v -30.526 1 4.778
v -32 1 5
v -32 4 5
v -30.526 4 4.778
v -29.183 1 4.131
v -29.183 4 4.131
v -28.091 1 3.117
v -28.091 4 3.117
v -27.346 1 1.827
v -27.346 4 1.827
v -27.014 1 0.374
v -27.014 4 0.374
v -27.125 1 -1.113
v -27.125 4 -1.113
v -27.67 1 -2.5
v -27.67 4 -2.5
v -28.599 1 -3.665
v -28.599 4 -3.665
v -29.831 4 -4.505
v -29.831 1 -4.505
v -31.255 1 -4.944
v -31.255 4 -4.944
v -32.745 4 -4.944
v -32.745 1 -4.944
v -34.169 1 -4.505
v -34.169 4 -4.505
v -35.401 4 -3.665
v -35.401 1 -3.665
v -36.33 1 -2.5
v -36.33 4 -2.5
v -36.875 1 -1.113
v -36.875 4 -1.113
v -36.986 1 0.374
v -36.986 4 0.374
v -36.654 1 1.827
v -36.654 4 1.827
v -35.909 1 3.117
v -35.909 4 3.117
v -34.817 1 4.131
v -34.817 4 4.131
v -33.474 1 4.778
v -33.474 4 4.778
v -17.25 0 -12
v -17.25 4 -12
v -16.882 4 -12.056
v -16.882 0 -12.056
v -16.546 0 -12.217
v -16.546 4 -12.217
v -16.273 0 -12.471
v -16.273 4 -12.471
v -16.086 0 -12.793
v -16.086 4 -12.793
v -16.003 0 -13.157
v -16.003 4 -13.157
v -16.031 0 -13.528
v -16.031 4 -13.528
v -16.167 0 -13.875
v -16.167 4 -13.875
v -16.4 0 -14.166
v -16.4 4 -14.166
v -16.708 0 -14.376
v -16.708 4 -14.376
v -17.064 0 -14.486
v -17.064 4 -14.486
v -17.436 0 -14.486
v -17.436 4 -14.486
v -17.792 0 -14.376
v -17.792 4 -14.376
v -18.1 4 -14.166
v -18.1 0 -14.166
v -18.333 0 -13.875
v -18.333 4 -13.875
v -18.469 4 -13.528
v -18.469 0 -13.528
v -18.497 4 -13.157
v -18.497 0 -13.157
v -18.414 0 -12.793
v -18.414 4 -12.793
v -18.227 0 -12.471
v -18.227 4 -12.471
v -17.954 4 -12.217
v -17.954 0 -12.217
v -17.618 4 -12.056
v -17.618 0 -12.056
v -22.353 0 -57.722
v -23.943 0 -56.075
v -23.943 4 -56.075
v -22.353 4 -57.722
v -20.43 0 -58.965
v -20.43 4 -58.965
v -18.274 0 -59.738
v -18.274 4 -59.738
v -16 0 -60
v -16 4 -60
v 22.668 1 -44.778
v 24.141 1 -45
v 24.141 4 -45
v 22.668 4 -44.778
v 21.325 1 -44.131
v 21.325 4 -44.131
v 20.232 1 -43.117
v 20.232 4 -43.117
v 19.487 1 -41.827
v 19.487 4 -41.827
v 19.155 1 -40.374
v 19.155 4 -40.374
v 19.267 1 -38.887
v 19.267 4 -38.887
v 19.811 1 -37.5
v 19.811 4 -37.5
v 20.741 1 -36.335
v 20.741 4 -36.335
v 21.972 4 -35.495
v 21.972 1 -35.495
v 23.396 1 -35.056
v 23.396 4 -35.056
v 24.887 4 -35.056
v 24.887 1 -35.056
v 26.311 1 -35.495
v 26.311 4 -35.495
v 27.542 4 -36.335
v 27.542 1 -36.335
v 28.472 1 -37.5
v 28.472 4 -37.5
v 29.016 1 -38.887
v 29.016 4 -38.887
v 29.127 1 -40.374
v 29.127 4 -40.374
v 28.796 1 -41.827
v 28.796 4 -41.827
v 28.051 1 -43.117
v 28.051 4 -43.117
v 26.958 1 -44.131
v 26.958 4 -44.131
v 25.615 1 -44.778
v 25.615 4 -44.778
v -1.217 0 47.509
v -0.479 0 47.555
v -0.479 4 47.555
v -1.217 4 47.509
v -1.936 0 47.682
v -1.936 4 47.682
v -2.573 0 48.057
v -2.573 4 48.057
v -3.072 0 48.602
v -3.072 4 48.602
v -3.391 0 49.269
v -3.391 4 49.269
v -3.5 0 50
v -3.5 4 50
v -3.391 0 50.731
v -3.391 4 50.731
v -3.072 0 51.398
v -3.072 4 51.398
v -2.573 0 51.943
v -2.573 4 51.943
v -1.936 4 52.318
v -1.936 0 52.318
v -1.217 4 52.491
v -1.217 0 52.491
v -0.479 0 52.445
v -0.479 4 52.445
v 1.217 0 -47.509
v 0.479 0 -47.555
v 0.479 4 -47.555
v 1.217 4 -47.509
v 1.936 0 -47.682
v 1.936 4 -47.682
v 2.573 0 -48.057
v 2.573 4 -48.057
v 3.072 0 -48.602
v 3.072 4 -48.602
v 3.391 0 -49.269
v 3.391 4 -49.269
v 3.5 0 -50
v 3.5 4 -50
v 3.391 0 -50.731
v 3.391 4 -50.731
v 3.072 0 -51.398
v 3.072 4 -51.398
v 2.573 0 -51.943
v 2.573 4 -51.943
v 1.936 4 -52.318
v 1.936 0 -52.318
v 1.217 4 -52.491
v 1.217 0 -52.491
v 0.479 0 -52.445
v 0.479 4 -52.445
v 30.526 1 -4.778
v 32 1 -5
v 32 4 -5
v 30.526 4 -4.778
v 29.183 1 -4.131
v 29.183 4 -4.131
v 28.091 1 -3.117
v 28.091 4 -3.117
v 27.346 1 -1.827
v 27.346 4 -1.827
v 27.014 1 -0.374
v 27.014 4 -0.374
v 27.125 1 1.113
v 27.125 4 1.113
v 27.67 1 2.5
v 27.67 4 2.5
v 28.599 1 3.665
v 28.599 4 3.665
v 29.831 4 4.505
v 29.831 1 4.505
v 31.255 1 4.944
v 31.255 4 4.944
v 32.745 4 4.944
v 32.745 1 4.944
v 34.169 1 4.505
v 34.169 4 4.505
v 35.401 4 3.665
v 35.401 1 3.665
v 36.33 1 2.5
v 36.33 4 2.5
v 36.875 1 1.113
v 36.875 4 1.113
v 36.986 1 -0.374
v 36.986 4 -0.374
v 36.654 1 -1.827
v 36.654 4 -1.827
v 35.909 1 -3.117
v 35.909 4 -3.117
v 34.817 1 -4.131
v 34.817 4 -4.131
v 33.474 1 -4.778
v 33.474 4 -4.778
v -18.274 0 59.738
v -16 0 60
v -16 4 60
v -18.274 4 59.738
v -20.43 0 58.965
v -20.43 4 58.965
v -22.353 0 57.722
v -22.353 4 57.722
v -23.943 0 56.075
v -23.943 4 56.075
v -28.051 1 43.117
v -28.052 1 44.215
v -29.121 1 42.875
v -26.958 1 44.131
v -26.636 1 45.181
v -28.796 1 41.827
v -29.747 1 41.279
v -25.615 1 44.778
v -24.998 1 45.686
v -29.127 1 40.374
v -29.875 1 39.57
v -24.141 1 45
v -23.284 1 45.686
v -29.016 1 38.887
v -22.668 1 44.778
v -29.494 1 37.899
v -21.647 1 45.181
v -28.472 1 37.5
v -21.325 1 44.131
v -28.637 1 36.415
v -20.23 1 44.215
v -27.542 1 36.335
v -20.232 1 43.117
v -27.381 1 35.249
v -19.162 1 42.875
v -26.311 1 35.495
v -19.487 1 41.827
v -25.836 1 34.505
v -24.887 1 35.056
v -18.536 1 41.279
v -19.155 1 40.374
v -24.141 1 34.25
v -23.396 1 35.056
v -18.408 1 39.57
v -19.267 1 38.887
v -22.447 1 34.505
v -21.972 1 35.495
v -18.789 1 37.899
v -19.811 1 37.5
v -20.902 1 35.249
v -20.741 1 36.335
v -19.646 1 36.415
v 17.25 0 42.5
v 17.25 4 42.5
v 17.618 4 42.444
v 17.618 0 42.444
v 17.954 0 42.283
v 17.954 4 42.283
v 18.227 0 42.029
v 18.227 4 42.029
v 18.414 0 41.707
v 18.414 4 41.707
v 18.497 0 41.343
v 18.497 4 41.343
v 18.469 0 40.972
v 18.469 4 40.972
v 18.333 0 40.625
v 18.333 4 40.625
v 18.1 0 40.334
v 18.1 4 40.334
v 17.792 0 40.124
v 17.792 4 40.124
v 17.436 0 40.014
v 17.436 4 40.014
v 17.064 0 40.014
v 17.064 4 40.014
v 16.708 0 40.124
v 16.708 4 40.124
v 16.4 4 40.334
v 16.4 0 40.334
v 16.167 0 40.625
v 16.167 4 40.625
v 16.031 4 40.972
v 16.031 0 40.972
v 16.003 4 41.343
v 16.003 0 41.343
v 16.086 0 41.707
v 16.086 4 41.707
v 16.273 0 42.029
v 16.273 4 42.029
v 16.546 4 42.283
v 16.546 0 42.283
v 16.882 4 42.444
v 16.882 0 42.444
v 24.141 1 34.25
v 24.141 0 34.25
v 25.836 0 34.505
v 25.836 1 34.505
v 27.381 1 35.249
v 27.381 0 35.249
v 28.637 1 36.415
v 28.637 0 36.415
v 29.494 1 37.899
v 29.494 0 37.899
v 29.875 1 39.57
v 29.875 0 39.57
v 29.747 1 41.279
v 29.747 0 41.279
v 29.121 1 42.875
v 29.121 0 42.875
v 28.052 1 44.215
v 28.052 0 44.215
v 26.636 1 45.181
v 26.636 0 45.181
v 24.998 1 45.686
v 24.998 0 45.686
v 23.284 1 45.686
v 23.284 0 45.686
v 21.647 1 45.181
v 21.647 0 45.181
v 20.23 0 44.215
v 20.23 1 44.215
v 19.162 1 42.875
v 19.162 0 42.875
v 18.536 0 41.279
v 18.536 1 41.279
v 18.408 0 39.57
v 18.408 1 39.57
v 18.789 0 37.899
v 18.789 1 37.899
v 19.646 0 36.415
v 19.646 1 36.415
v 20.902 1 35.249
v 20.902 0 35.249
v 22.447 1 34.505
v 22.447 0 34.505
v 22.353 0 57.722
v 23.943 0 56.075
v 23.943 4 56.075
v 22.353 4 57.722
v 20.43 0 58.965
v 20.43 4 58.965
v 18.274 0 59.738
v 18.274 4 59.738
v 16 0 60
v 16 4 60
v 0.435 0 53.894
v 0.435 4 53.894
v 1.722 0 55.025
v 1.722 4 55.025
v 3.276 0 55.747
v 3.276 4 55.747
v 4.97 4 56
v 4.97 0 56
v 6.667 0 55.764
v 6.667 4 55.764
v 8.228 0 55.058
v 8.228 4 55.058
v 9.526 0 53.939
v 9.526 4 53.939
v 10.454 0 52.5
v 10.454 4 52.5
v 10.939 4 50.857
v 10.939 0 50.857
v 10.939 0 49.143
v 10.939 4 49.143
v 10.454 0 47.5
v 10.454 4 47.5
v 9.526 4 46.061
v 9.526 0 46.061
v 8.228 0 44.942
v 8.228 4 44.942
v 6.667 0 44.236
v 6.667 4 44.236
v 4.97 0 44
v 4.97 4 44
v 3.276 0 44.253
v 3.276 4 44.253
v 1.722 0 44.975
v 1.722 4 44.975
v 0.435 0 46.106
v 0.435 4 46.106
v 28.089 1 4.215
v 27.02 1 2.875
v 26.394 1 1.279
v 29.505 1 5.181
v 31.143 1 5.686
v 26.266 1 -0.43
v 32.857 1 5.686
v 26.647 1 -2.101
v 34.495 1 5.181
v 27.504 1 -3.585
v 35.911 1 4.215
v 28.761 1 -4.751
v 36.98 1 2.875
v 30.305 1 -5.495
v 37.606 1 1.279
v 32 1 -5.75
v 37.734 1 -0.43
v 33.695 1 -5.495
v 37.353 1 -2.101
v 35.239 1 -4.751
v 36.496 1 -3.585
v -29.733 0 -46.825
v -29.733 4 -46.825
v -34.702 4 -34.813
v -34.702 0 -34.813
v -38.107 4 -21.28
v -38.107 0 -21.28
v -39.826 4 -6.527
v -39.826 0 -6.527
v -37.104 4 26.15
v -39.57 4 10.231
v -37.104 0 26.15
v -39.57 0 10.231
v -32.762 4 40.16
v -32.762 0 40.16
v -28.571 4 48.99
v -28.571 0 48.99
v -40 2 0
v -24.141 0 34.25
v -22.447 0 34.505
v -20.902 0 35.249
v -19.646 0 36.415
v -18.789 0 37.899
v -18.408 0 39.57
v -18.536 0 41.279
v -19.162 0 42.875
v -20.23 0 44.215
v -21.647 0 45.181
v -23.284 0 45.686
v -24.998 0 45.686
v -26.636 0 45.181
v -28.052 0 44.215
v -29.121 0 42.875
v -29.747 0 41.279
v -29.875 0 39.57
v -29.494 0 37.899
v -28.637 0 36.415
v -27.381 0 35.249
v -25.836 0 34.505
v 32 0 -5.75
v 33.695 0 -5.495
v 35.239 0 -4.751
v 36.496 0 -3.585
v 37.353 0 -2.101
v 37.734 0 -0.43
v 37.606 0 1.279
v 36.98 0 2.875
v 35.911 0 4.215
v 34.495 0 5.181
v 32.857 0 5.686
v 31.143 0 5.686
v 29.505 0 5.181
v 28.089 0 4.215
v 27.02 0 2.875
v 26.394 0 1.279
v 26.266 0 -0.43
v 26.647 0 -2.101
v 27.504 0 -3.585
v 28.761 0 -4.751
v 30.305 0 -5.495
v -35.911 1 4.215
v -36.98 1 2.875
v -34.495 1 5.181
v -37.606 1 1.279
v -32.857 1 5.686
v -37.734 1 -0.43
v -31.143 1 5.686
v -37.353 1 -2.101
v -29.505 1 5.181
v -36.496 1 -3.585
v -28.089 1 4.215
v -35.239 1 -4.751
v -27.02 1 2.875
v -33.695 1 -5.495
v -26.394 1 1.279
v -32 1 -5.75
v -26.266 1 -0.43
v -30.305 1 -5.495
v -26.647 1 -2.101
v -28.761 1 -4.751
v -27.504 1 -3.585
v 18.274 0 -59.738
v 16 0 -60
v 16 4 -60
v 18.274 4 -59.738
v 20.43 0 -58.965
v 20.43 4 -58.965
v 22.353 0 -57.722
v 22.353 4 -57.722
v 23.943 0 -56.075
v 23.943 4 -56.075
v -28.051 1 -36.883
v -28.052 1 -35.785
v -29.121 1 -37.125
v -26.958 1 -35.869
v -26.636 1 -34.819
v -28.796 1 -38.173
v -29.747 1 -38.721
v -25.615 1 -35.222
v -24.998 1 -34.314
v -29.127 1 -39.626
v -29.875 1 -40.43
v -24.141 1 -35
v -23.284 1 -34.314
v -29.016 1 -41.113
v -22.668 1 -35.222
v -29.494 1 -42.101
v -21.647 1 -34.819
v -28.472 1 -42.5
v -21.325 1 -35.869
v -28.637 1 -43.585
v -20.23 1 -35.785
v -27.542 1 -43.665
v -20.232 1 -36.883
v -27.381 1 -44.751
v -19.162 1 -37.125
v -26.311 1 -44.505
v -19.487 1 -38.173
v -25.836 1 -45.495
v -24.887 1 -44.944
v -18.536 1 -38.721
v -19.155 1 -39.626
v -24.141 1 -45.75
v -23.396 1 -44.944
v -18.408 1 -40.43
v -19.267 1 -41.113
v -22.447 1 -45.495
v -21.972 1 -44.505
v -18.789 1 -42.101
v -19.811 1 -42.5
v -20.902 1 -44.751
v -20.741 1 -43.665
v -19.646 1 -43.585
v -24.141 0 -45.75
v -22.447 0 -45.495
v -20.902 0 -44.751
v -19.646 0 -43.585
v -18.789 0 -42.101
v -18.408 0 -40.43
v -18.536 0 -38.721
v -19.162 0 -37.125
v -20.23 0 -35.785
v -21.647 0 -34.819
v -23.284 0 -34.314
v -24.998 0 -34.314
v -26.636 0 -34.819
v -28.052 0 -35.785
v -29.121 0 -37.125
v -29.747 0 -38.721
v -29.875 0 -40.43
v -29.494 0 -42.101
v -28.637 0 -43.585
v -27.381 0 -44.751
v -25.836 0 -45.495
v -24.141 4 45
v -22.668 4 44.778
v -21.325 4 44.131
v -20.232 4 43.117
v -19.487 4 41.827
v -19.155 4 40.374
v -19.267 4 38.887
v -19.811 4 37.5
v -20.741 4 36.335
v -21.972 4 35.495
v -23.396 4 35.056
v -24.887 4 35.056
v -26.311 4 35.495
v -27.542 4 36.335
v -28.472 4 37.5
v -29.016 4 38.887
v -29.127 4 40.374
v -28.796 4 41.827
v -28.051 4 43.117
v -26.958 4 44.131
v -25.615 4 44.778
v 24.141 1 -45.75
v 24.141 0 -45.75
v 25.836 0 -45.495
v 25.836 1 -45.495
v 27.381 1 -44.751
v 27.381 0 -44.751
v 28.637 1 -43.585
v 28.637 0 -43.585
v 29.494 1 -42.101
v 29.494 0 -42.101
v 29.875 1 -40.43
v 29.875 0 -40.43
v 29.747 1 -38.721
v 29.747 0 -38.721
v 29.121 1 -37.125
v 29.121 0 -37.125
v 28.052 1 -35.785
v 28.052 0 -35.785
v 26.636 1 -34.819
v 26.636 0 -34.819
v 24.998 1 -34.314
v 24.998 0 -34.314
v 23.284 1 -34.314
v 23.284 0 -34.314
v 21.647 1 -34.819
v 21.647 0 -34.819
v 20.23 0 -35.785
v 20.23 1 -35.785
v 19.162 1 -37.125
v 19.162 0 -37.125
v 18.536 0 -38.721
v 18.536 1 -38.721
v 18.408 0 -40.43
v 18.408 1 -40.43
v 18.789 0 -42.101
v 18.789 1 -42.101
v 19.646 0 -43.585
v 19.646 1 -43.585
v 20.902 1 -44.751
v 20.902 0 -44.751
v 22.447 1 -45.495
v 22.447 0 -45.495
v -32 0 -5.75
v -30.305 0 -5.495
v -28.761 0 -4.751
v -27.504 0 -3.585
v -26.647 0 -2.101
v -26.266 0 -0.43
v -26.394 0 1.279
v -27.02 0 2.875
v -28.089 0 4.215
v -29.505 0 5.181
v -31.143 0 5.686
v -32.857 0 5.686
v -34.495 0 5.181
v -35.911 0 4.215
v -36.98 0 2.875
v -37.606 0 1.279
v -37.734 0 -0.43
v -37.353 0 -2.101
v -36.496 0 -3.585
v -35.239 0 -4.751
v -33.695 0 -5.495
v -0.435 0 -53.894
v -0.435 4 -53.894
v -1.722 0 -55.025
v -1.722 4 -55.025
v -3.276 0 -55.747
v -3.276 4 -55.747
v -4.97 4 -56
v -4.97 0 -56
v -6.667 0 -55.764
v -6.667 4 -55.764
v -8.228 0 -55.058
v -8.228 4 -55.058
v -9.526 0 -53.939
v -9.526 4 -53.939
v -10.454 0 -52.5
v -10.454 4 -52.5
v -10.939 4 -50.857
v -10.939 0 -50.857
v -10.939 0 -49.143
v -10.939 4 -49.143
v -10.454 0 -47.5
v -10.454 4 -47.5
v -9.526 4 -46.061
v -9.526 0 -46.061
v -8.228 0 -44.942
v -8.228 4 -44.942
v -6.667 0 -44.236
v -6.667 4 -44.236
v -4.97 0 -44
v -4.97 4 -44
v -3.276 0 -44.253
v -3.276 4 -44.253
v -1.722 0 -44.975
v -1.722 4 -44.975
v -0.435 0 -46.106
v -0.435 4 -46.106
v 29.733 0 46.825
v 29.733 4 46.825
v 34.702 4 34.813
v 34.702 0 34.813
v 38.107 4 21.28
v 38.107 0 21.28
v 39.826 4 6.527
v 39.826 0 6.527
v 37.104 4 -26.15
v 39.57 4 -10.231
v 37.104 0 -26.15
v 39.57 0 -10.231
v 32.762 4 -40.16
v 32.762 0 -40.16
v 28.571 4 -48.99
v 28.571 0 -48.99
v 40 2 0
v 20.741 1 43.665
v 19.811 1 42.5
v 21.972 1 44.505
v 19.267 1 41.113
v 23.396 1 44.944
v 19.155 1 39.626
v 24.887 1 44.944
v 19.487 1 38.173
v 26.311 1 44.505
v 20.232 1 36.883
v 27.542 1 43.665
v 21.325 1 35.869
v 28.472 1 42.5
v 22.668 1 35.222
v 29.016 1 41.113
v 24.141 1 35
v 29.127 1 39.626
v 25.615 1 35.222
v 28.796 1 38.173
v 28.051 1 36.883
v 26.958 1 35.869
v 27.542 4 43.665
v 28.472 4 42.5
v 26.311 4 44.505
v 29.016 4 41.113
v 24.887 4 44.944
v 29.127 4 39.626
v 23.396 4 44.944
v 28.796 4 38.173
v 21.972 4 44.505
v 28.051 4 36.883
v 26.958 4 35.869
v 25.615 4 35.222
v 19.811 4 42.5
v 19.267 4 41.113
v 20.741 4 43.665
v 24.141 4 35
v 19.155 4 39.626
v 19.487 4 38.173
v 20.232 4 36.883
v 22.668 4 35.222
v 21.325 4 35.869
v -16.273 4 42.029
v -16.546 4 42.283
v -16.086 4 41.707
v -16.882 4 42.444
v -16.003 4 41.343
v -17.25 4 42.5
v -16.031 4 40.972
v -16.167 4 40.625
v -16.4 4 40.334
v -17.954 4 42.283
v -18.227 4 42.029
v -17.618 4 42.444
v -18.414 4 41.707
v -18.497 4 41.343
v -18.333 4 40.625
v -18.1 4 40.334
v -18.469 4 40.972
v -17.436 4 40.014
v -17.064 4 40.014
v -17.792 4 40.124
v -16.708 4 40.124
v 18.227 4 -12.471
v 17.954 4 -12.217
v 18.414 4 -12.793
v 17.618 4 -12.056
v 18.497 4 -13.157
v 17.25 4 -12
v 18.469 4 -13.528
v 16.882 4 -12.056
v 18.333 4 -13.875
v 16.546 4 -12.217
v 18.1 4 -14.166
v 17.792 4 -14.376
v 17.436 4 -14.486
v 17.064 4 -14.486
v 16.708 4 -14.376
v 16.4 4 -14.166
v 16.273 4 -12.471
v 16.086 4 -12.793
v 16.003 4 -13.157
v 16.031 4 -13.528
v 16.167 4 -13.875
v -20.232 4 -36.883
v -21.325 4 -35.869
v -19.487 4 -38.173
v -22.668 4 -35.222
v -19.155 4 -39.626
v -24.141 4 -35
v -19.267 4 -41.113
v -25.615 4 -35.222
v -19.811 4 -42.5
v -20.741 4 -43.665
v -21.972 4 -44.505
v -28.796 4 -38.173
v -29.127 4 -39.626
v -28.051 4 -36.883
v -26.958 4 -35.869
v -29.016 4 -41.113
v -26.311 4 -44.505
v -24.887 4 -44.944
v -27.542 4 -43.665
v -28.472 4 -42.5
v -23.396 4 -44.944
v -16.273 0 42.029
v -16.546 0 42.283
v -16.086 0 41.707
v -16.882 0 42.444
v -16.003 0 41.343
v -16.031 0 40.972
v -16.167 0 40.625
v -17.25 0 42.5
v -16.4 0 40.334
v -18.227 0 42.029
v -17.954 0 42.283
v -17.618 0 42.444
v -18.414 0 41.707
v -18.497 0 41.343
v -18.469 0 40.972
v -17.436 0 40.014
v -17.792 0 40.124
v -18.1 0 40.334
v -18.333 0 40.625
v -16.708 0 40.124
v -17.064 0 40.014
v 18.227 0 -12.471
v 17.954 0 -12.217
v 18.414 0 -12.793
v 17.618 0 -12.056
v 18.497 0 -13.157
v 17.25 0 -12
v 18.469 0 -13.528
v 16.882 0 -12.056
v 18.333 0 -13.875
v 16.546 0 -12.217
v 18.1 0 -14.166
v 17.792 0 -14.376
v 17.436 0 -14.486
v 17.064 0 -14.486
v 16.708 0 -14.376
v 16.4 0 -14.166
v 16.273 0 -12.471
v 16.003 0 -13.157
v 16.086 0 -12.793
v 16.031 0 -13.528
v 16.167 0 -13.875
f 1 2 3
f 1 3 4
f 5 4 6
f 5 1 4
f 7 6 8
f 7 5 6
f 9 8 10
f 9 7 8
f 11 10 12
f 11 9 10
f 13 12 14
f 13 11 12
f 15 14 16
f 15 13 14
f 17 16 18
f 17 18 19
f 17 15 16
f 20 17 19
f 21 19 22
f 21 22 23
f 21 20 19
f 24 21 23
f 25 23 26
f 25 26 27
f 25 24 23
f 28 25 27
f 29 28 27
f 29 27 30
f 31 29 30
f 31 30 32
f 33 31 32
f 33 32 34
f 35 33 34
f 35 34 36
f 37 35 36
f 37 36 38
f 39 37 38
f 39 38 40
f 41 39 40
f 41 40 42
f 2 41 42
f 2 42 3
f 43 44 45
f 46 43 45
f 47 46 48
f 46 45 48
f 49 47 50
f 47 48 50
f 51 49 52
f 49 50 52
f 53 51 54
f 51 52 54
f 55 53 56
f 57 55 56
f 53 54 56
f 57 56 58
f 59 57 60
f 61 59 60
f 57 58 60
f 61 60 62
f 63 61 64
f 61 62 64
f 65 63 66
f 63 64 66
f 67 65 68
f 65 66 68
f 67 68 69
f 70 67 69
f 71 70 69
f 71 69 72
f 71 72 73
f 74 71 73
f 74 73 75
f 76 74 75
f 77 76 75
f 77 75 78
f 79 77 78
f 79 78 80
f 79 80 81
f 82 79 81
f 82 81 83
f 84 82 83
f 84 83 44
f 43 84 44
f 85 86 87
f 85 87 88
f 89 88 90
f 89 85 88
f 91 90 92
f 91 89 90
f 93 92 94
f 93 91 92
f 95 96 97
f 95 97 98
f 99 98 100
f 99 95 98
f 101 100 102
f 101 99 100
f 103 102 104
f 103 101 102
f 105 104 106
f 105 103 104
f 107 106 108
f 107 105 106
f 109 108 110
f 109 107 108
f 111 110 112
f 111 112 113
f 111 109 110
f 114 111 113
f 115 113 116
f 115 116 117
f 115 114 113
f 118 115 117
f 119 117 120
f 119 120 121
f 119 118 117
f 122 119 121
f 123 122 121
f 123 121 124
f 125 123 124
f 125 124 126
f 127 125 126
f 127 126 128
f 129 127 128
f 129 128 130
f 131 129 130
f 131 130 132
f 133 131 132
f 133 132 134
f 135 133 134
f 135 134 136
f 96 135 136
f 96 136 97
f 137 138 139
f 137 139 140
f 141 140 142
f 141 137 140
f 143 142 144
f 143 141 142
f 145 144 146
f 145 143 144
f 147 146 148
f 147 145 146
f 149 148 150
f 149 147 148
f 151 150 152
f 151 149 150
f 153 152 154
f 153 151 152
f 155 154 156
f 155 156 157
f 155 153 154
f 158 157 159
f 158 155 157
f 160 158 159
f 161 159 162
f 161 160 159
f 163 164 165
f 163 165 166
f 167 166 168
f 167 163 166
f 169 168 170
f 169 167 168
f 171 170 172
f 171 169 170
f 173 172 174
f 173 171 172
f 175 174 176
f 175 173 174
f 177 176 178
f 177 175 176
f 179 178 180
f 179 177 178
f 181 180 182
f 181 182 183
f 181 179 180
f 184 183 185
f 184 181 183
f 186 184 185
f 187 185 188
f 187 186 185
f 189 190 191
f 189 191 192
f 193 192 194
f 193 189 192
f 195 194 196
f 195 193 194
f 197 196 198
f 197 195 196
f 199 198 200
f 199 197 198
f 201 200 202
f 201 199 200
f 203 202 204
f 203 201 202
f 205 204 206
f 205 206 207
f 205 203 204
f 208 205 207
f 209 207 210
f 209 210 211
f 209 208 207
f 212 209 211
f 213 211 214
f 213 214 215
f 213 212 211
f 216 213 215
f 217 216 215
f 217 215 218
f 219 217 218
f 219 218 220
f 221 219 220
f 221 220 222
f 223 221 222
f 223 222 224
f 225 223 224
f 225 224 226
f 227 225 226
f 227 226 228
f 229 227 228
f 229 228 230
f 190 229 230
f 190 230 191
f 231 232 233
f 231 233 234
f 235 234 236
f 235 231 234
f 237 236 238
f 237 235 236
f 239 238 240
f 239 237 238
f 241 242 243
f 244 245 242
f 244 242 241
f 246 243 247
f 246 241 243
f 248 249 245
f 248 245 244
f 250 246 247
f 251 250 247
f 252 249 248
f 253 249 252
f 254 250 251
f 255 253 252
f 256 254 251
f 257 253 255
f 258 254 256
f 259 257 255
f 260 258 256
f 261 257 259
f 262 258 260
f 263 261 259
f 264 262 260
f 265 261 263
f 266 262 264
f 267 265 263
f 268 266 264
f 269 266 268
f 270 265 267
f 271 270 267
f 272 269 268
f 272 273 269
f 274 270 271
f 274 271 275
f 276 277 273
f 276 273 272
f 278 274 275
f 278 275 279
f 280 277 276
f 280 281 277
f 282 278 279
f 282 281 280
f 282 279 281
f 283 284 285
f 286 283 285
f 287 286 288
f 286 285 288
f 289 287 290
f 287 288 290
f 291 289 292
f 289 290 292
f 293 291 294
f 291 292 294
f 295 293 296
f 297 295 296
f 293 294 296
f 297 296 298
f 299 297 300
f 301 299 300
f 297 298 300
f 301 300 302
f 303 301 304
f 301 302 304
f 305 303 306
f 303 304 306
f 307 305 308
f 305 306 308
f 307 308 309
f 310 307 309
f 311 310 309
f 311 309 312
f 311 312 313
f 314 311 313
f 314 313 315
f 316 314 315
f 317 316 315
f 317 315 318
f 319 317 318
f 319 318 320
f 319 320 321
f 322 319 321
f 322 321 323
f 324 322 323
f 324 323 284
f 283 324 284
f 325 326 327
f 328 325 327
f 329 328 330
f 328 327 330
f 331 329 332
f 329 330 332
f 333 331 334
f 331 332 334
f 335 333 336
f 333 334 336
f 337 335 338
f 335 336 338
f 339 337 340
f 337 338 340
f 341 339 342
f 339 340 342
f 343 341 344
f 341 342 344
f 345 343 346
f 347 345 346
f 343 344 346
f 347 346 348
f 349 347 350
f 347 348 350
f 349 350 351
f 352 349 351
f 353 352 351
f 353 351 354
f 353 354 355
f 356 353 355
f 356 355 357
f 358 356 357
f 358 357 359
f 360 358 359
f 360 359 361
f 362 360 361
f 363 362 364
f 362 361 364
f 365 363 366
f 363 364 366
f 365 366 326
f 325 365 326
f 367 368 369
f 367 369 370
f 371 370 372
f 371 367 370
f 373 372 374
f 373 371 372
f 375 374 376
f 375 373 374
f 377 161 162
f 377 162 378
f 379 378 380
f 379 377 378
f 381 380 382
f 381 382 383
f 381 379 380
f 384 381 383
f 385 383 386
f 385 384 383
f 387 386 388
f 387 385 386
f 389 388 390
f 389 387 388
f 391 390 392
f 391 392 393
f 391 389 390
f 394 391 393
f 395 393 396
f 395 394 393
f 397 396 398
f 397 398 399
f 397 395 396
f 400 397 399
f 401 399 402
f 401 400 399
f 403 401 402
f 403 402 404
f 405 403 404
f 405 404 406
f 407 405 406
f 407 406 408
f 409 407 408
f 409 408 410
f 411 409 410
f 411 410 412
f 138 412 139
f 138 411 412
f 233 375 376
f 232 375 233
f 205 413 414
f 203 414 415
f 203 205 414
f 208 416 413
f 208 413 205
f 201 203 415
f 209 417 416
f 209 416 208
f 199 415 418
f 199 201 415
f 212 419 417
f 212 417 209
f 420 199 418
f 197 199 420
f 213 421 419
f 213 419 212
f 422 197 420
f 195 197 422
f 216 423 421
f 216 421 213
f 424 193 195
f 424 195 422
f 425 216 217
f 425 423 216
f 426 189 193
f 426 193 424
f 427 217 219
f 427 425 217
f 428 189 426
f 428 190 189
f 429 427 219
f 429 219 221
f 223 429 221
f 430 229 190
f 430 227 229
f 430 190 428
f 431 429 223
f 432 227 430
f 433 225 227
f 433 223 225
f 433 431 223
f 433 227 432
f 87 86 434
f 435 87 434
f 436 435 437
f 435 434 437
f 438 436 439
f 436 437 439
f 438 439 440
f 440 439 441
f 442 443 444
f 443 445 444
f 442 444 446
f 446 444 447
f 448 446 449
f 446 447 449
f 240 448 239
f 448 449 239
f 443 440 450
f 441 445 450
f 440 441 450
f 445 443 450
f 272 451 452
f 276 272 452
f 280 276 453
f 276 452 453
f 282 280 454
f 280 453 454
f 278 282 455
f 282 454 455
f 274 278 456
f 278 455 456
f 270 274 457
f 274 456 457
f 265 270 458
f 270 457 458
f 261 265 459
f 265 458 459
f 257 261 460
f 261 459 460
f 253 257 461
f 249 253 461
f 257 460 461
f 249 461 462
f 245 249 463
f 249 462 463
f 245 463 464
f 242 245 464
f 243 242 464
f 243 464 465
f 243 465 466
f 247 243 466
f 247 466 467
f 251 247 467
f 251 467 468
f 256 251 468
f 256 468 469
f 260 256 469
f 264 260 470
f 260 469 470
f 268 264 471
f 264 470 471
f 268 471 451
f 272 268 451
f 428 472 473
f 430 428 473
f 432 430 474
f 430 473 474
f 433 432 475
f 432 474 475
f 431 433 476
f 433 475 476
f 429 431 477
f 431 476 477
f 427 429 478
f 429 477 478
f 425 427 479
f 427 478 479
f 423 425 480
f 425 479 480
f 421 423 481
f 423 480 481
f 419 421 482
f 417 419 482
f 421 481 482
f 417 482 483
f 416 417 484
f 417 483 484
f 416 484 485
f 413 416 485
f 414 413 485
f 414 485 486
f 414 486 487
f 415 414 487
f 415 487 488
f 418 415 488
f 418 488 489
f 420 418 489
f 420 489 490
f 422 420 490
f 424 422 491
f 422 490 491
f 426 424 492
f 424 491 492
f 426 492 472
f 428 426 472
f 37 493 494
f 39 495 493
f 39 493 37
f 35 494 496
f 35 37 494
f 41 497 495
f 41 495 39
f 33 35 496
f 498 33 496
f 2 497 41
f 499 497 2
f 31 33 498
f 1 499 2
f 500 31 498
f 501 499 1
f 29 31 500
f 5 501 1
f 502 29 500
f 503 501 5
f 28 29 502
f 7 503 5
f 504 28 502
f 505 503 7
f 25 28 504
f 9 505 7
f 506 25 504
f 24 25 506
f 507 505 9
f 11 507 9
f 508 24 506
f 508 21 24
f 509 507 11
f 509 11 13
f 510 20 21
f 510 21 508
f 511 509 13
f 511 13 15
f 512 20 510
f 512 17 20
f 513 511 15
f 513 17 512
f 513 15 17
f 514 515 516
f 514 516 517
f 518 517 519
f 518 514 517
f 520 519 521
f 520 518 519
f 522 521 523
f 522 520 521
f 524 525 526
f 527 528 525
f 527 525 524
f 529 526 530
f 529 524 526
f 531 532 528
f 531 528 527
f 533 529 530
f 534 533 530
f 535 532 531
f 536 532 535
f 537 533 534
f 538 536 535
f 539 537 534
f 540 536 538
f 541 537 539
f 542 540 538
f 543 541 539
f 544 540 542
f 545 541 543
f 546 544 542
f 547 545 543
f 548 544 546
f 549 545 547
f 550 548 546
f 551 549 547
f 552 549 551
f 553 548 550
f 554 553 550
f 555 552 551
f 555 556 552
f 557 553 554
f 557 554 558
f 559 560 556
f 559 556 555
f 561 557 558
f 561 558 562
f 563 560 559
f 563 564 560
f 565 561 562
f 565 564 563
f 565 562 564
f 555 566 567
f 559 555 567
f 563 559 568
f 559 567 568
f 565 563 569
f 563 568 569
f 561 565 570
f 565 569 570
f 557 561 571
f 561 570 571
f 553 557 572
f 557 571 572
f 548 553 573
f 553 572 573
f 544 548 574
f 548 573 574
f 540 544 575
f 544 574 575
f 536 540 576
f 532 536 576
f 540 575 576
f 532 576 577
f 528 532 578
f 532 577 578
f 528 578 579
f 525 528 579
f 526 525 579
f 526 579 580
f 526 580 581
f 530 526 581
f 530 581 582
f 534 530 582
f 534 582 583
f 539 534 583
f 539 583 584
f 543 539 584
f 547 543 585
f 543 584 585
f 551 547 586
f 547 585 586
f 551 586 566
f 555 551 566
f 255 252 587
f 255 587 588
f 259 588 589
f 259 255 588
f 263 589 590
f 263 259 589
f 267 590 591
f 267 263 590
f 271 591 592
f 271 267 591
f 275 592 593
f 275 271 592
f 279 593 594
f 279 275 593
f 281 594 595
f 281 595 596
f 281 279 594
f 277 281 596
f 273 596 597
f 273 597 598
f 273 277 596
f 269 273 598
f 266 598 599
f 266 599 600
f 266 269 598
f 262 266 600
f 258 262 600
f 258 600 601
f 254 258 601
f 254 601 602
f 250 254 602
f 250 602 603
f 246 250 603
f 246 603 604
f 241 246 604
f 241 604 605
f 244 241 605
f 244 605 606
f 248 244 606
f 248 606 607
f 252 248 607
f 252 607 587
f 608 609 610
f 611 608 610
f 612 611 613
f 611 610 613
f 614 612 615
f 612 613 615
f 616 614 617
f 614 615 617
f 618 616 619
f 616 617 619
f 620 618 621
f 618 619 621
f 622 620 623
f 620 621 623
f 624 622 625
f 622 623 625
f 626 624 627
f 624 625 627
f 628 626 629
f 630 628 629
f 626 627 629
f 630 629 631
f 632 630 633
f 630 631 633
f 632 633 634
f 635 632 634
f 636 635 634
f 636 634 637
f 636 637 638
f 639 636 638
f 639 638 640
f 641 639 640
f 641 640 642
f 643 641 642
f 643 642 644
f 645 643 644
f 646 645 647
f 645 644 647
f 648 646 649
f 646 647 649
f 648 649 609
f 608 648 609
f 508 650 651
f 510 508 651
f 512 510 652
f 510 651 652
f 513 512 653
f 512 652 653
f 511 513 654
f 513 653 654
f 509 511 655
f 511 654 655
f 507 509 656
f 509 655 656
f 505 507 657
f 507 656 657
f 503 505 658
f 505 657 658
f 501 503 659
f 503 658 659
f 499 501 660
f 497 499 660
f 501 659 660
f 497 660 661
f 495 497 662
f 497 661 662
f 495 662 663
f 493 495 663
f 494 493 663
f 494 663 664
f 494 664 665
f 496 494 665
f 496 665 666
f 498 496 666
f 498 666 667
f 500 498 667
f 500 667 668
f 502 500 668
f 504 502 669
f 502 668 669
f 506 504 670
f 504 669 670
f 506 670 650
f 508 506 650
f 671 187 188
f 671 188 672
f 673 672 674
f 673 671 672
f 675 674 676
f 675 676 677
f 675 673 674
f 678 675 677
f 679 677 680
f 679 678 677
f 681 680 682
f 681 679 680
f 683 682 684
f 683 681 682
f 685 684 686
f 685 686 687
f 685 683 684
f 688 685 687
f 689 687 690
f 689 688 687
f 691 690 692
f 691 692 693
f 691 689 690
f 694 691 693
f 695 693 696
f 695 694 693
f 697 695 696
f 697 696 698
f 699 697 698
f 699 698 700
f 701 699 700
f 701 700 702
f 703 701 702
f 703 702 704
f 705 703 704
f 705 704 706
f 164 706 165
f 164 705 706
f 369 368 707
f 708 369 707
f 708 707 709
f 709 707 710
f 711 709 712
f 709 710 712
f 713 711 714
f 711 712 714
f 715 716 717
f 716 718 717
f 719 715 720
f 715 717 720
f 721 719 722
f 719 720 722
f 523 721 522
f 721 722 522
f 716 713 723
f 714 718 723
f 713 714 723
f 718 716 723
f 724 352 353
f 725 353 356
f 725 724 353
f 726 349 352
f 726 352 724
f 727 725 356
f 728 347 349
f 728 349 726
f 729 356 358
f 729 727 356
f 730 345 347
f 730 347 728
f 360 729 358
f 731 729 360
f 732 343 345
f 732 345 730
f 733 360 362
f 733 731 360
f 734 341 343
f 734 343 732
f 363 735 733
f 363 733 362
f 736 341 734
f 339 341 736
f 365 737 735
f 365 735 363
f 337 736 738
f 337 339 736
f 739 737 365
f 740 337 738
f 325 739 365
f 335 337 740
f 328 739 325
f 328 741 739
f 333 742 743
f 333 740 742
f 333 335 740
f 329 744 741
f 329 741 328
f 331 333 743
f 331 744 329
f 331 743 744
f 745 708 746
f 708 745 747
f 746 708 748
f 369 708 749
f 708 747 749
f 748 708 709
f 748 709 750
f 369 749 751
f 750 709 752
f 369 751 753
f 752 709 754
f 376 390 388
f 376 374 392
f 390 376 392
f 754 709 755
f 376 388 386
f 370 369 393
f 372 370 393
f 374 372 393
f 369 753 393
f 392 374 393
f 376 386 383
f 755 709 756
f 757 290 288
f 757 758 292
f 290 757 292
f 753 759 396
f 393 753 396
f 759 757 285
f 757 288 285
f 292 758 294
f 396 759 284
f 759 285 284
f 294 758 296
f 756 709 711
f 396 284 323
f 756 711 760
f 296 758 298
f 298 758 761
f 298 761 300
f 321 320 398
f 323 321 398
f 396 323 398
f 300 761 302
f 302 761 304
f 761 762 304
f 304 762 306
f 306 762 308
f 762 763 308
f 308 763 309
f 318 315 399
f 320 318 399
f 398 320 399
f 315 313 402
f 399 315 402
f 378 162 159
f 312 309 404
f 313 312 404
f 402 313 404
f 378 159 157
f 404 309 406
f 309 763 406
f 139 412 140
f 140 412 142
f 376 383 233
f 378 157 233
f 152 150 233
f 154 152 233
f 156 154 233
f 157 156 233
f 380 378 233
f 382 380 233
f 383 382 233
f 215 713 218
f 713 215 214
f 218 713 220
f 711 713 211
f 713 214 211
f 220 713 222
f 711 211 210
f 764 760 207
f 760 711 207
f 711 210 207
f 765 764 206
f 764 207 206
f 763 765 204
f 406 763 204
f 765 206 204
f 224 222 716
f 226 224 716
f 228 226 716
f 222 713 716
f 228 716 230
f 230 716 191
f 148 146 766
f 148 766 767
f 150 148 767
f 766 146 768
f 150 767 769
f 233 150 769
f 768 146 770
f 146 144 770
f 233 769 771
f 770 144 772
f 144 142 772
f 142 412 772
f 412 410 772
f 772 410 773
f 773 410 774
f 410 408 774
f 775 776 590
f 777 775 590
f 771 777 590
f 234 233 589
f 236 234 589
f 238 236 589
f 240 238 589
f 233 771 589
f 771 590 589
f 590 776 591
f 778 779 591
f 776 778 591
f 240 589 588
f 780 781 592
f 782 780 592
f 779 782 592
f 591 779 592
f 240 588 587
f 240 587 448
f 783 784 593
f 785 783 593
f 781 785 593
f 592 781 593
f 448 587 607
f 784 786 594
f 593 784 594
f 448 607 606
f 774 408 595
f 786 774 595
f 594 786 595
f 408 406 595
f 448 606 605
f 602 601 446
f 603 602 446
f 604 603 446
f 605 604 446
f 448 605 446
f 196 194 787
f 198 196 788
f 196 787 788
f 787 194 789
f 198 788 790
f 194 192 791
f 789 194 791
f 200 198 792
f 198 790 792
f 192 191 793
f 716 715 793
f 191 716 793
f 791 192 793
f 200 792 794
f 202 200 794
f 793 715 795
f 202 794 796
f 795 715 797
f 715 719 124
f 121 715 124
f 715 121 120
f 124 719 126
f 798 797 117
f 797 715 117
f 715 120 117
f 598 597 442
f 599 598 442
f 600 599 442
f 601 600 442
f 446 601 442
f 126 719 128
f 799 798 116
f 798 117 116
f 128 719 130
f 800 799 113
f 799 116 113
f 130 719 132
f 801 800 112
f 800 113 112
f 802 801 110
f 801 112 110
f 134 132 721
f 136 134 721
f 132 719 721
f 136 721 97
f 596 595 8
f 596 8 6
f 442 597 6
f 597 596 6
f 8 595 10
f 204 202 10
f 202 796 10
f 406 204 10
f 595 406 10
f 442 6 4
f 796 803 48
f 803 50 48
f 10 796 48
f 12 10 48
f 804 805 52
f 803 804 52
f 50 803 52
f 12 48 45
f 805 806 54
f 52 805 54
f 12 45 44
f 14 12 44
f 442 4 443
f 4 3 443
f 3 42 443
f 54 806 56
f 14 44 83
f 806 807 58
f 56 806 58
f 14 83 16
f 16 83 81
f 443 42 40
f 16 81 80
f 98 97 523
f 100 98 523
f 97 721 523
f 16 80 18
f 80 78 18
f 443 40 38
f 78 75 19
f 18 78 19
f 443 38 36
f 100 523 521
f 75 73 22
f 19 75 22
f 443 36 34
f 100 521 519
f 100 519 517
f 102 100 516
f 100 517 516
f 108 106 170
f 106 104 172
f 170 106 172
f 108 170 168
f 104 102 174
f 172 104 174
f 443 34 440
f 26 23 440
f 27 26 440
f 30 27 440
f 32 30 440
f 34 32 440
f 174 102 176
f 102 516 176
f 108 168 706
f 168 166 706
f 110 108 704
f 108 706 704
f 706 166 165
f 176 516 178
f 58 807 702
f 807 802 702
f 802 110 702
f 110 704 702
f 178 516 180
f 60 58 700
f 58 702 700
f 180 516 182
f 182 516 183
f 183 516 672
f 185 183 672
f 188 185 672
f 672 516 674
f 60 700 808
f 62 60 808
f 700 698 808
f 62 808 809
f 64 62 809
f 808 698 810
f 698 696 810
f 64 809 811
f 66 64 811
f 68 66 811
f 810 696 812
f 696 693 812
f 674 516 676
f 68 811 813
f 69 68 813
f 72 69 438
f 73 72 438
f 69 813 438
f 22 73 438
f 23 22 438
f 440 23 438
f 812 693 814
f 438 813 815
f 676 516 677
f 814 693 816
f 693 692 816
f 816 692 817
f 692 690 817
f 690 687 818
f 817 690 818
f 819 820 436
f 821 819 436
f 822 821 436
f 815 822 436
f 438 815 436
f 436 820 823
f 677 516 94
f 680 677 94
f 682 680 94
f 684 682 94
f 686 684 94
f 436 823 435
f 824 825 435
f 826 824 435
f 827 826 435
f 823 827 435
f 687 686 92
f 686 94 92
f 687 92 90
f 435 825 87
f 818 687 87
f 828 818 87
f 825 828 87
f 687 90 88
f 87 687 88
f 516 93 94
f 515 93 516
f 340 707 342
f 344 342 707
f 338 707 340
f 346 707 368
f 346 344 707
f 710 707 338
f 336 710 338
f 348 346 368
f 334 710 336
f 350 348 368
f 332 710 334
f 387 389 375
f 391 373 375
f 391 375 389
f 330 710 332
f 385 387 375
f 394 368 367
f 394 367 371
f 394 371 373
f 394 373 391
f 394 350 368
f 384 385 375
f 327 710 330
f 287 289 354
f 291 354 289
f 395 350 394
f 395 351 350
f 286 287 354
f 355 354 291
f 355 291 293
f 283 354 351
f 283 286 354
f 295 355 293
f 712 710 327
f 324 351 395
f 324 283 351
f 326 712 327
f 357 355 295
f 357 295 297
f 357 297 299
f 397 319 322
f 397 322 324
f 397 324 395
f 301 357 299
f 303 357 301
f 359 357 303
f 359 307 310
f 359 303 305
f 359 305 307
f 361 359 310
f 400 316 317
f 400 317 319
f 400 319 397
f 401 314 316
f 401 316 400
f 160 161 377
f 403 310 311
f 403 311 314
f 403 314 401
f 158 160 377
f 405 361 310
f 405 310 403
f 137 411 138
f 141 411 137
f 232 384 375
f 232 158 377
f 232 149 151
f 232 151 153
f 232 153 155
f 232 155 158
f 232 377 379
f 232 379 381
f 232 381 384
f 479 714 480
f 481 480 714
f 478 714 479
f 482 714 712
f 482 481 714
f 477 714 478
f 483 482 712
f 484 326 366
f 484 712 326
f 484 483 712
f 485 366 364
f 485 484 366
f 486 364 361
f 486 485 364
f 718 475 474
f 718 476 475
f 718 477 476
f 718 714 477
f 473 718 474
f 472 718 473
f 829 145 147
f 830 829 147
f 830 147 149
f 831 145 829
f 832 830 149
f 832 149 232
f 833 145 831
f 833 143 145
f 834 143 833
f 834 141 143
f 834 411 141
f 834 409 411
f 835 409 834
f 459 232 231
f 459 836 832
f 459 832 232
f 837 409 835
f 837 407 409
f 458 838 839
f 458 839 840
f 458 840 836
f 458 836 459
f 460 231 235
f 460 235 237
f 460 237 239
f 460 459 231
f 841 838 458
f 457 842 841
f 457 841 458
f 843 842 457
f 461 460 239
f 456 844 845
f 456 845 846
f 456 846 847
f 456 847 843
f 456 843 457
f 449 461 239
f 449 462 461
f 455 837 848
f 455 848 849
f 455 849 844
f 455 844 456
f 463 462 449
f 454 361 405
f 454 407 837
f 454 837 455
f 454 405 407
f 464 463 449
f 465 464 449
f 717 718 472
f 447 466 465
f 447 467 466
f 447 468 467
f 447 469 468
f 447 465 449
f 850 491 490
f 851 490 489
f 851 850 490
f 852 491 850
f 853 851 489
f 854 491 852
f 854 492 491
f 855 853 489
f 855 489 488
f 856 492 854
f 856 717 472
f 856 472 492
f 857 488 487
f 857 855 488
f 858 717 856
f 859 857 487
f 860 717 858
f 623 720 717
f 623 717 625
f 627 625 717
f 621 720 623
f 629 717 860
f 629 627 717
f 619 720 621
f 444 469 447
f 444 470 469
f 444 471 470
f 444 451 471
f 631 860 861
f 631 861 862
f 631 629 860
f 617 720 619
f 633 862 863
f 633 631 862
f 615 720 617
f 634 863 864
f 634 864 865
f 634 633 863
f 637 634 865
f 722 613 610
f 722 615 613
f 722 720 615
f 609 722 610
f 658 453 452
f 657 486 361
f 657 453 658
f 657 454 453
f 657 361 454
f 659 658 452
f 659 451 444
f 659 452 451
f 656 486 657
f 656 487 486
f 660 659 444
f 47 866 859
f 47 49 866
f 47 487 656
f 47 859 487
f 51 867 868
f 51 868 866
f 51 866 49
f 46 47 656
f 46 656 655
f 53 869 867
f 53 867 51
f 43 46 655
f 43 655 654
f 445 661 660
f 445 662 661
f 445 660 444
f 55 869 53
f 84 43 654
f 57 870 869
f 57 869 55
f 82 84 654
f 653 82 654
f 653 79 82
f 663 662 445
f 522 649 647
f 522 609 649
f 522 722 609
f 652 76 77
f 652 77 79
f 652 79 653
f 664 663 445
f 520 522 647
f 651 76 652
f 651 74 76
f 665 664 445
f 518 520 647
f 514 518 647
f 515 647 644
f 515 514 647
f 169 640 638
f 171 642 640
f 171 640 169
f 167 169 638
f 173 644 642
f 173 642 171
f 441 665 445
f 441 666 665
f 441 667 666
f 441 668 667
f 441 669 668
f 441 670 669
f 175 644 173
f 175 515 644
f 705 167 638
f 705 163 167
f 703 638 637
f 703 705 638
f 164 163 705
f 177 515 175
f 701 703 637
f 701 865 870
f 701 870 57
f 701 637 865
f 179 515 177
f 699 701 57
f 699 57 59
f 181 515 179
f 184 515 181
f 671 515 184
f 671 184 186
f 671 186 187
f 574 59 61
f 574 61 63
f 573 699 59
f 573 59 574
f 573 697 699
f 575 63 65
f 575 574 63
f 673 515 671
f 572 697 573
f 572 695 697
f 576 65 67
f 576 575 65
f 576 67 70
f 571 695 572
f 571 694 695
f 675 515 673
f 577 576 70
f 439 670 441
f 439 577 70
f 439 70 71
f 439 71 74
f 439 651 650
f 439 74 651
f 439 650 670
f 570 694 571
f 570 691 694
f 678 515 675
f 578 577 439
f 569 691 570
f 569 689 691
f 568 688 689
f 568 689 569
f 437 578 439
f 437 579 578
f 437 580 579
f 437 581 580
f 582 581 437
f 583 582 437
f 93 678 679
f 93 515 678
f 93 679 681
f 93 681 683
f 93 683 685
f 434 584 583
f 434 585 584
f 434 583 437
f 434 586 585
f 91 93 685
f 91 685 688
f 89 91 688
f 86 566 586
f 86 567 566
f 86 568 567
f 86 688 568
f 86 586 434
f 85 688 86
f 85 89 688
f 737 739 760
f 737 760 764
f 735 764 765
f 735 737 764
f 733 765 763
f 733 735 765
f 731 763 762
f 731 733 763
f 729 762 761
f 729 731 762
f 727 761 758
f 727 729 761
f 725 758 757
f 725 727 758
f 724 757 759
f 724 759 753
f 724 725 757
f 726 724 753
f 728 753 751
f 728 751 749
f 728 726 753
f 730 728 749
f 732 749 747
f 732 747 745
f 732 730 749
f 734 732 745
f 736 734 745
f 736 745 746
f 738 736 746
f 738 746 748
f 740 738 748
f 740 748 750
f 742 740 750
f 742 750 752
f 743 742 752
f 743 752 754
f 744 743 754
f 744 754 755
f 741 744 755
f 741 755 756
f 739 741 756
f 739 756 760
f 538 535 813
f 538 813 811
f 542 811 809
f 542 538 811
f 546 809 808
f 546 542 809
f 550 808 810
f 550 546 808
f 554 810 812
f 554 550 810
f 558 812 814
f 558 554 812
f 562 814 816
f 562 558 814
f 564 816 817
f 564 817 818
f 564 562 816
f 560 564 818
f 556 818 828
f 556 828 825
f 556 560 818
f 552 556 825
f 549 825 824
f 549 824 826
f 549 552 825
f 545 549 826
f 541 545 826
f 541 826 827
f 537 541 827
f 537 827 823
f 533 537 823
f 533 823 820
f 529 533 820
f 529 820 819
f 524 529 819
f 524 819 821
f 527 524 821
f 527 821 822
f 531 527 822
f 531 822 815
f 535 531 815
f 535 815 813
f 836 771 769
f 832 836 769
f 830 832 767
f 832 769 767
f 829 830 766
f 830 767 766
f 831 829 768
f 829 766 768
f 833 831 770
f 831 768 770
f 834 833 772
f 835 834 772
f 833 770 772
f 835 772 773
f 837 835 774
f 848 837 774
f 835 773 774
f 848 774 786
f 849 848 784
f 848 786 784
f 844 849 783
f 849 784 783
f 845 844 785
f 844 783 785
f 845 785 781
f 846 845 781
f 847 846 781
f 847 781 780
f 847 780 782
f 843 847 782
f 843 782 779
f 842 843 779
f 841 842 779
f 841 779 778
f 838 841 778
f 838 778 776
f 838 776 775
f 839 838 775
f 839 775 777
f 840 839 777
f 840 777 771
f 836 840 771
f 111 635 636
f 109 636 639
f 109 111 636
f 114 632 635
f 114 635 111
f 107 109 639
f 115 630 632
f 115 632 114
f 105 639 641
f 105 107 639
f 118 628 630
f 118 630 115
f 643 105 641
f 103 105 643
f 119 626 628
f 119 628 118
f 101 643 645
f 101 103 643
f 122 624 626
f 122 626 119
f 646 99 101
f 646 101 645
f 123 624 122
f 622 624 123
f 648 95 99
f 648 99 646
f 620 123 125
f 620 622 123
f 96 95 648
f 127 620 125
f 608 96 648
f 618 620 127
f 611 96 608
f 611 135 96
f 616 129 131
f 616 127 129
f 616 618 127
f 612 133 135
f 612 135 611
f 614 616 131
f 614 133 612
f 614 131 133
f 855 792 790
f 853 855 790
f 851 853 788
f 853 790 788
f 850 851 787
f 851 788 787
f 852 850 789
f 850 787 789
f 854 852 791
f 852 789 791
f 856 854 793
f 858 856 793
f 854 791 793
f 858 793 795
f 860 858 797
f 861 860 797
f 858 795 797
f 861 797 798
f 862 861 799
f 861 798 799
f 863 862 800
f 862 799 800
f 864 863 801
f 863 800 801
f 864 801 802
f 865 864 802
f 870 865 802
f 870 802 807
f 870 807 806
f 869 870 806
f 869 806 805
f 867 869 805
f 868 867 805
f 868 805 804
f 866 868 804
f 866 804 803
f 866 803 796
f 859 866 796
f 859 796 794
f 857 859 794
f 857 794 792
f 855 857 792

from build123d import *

# Parameters (mm, degrees)
SKETCH1_R           = 5
BOSS_EXTRUDE1_DEPTH = 4
SKETCH3_R           = 5.75
CUT_EXTRUDE2_DEPTH  = 1
CUT_EXTRUDE3_REACH  = 74.222
SKETCH4_R           = 1.25


with BuildPart() as part:
    # Sketch1 → Boss-Extrude1 (new body)
    with BuildSketch(Plane(origin=(0, 0, 0), x_dir=(1, 0, 0), z_dir=(0, 1, 0))):
        with BuildLine():
            Line((-15.999553812, 60), (15.999553812, 60))
            ThreePointArc((15.999553812, 60), (20.429760931, 58.965113769), (23.94301598, 56.074652977))
            add(Edge.make_bspline(
                [(23.94301598, -56.074652977), (66.825332337, 0), (23.94301598, 56.074652977)],
                knots=[3.783314198, 3.783314198, 3.783314198, 5.641463762, 5.641463762, 5.641463762], degree=2, weights=[1, 0.598575399, 1]))
            ThreePointArc((23.94301598, -56.074652977), (20.429760931, -58.965113769), (15.999553812, -60))
            Line((15.999553812, -60), (-15.999553812, -60))
            ThreePointArc((-15.999553812, -60), (-20.429760931, -58.965113769), (-23.94301598, -56.074652977))
            add(Edge.make_bspline(
                [(-23.94301598, 56.074652977), (-66.825332337, 0), (-23.94301598, -56.074652977)],
                knots=[0.641721545, 0.641721545, 0.641721545, 2.499871109, 2.499871109, 2.499871109], degree=2, weights=[1, 0.598575399, 1]))
            ThreePointArc((-23.94301598, 56.074652977), (-20.429760931, 58.965113769), (-15.999553812, 60))
        make_face()
        with Locations(Location((-32, 0, 0), (0, 0, 270))):
            Circle(SKETCH1_R, mode=Mode.SUBTRACT)
        with Locations(Location((-24.141452548, 40, 0), (0, 0, 270))):
            Circle(SKETCH1_R, mode=Mode.SUBTRACT)
        with Locations(Location((-24.141452548, -40, 0), (0, 0, 270))):
            Circle(SKETCH1_R, mode=Mode.SUBTRACT)
        with Locations(Location((24.141452548, -40, 0), (0, 0, 90))):
            Circle(SKETCH1_R, mode=Mode.SUBTRACT)
        with Locations(Location((32, 0, 0), (0, 0, 90))):
            Circle(SKETCH1_R, mode=Mode.SUBTRACT)
        with Locations(Location((24.141452548, 40, 0), (0, 0, 90))):
            Circle(SKETCH1_R, mode=Mode.SUBTRACT)
        with BuildLine():
            ThreePointArc((-0.479166667, -52.445144707), (11, -50), (-0.479166667, -47.554855293))
            ThreePointArc((-0.479166667, -47.554855293), (-3.5, -50), (-0.479166667, -52.445144707))
        make_face(mode=Mode.SUBTRACT)
        with BuildLine():
            ThreePointArc((0.479166667, 52.445144707), (-11, 50), (0.479166667, 47.554855293))
            ThreePointArc((0.479166667, 47.554855293), (3.5, 50), (0.479166667, 52.445144707))
        make_face(mode=Mode.SUBTRACT)
    extrude(amount=BOSS_EXTRUDE1_DEPTH)

    # Sketch3 → Cut-Extrude2 (cut)
    with BuildSketch(Plane.XZ):
        with Locations(Location((-24.141452548, -40, 0), (0, 0, 270))):
            Circle(SKETCH3_R)
        with Locations(Location((24.141452548, -40, 0), (0, 0, 270))):
            Circle(SKETCH3_R)
        with Locations(Location((32, 0, 0), (0, 0, 270))):
            Circle(SKETCH3_R)
        with Locations(Location((24.141452548, 40, 0), (0, 0, 270))):
            Circle(SKETCH3_R)
        with Locations(Location((-24.141452548, 40, 0), (0, 0, 270))):
            Circle(SKETCH3_R)
        with Locations(Location((-32, 0, 0), (0, 0, 270))):
            Circle(SKETCH3_R)
    extrude(amount=-CUT_EXTRUDE2_DEPTH, mode=Mode.SUBTRACT)

    # Sketch4 → Cut-Extrude3 (cut, up to next)
    with BuildSketch(Plane(origin=(0, 4, 0), x_dir=(1, 0, 0), z_dir=(0, 1, 0)), mode=Mode.PRIVATE) as cut_extrude3_sk1:
        with Locations(Location((17.25, -41.25, 0), (0, 0, 270))):
            Circle(SKETCH4_R)
    cut_extrude3_tool1 = extrude(cut_extrude3_sk1.sketch, amount=-CUT_EXTRUDE3_REACH, mode=Mode.PRIVATE) & part.part
    # Sketch4 → Cut-Extrude3 (cut, up to next)
    with BuildSketch(Plane(origin=(0, 4, 0), x_dir=(1, 0, 0), z_dir=(0, 1, 0)), mode=Mode.PRIVATE) as cut_extrude3_sk2:
        with Locations(Location((17.25, 13.25, 0), (0, 0, 270))):
            Circle(SKETCH4_R)
    cut_extrude3_tool2 = extrude(cut_extrude3_sk2.sketch, amount=-CUT_EXTRUDE3_REACH, mode=Mode.PRIVATE) & part.part
    # Sketch4 → Cut-Extrude3 (cut, up to next)
    with BuildSketch(Plane(origin=(0, 4, 0), x_dir=(1, 0, 0), z_dir=(0, 1, 0)), mode=Mode.PRIVATE) as cut_extrude3_sk3:
        with Locations(Location((-17.25, 13.25, 0), (0, 0, 270))):
            Circle(SKETCH4_R)
    cut_extrude3_tool3 = extrude(cut_extrude3_sk3.sketch, amount=-CUT_EXTRUDE3_REACH, mode=Mode.PRIVATE) & part.part
    # Sketch4 → Cut-Extrude3 (cut, up to next)
    with BuildSketch(Plane(origin=(0, 4, 0), x_dir=(1, 0, 0), z_dir=(0, 1, 0)), mode=Mode.PRIVATE) as cut_extrude3_sk4:
        with Locations(Location((-17.25, -41.25, 0), (0, 0, 270))):
            Circle(SKETCH4_R)
    cut_extrude3_tool4 = extrude(cut_extrude3_sk4.sketch, amount=-CUT_EXTRUDE3_REACH, mode=Mode.PRIVATE) & part.part
    add(cut_extrude3_tool1.solids().sort_by_distance((17.25, 4, 41.25))[0], mode=Mode.SUBTRACT)
    add(cut_extrude3_tool2.solids().sort_by_distance((17.25, 4, -13.25))[0], mode=Mode.SUBTRACT)
    add(cut_extrude3_tool3.solids().sort_by_distance((-17.25, 4, -13.25))[0], mode=Mode.SUBTRACT)
    add(cut_extrude3_tool4.solids().sort_by_distance((-17.25, 4, 41.25))[0], mode=Mode.SUBTRACT)


solid = part.part
